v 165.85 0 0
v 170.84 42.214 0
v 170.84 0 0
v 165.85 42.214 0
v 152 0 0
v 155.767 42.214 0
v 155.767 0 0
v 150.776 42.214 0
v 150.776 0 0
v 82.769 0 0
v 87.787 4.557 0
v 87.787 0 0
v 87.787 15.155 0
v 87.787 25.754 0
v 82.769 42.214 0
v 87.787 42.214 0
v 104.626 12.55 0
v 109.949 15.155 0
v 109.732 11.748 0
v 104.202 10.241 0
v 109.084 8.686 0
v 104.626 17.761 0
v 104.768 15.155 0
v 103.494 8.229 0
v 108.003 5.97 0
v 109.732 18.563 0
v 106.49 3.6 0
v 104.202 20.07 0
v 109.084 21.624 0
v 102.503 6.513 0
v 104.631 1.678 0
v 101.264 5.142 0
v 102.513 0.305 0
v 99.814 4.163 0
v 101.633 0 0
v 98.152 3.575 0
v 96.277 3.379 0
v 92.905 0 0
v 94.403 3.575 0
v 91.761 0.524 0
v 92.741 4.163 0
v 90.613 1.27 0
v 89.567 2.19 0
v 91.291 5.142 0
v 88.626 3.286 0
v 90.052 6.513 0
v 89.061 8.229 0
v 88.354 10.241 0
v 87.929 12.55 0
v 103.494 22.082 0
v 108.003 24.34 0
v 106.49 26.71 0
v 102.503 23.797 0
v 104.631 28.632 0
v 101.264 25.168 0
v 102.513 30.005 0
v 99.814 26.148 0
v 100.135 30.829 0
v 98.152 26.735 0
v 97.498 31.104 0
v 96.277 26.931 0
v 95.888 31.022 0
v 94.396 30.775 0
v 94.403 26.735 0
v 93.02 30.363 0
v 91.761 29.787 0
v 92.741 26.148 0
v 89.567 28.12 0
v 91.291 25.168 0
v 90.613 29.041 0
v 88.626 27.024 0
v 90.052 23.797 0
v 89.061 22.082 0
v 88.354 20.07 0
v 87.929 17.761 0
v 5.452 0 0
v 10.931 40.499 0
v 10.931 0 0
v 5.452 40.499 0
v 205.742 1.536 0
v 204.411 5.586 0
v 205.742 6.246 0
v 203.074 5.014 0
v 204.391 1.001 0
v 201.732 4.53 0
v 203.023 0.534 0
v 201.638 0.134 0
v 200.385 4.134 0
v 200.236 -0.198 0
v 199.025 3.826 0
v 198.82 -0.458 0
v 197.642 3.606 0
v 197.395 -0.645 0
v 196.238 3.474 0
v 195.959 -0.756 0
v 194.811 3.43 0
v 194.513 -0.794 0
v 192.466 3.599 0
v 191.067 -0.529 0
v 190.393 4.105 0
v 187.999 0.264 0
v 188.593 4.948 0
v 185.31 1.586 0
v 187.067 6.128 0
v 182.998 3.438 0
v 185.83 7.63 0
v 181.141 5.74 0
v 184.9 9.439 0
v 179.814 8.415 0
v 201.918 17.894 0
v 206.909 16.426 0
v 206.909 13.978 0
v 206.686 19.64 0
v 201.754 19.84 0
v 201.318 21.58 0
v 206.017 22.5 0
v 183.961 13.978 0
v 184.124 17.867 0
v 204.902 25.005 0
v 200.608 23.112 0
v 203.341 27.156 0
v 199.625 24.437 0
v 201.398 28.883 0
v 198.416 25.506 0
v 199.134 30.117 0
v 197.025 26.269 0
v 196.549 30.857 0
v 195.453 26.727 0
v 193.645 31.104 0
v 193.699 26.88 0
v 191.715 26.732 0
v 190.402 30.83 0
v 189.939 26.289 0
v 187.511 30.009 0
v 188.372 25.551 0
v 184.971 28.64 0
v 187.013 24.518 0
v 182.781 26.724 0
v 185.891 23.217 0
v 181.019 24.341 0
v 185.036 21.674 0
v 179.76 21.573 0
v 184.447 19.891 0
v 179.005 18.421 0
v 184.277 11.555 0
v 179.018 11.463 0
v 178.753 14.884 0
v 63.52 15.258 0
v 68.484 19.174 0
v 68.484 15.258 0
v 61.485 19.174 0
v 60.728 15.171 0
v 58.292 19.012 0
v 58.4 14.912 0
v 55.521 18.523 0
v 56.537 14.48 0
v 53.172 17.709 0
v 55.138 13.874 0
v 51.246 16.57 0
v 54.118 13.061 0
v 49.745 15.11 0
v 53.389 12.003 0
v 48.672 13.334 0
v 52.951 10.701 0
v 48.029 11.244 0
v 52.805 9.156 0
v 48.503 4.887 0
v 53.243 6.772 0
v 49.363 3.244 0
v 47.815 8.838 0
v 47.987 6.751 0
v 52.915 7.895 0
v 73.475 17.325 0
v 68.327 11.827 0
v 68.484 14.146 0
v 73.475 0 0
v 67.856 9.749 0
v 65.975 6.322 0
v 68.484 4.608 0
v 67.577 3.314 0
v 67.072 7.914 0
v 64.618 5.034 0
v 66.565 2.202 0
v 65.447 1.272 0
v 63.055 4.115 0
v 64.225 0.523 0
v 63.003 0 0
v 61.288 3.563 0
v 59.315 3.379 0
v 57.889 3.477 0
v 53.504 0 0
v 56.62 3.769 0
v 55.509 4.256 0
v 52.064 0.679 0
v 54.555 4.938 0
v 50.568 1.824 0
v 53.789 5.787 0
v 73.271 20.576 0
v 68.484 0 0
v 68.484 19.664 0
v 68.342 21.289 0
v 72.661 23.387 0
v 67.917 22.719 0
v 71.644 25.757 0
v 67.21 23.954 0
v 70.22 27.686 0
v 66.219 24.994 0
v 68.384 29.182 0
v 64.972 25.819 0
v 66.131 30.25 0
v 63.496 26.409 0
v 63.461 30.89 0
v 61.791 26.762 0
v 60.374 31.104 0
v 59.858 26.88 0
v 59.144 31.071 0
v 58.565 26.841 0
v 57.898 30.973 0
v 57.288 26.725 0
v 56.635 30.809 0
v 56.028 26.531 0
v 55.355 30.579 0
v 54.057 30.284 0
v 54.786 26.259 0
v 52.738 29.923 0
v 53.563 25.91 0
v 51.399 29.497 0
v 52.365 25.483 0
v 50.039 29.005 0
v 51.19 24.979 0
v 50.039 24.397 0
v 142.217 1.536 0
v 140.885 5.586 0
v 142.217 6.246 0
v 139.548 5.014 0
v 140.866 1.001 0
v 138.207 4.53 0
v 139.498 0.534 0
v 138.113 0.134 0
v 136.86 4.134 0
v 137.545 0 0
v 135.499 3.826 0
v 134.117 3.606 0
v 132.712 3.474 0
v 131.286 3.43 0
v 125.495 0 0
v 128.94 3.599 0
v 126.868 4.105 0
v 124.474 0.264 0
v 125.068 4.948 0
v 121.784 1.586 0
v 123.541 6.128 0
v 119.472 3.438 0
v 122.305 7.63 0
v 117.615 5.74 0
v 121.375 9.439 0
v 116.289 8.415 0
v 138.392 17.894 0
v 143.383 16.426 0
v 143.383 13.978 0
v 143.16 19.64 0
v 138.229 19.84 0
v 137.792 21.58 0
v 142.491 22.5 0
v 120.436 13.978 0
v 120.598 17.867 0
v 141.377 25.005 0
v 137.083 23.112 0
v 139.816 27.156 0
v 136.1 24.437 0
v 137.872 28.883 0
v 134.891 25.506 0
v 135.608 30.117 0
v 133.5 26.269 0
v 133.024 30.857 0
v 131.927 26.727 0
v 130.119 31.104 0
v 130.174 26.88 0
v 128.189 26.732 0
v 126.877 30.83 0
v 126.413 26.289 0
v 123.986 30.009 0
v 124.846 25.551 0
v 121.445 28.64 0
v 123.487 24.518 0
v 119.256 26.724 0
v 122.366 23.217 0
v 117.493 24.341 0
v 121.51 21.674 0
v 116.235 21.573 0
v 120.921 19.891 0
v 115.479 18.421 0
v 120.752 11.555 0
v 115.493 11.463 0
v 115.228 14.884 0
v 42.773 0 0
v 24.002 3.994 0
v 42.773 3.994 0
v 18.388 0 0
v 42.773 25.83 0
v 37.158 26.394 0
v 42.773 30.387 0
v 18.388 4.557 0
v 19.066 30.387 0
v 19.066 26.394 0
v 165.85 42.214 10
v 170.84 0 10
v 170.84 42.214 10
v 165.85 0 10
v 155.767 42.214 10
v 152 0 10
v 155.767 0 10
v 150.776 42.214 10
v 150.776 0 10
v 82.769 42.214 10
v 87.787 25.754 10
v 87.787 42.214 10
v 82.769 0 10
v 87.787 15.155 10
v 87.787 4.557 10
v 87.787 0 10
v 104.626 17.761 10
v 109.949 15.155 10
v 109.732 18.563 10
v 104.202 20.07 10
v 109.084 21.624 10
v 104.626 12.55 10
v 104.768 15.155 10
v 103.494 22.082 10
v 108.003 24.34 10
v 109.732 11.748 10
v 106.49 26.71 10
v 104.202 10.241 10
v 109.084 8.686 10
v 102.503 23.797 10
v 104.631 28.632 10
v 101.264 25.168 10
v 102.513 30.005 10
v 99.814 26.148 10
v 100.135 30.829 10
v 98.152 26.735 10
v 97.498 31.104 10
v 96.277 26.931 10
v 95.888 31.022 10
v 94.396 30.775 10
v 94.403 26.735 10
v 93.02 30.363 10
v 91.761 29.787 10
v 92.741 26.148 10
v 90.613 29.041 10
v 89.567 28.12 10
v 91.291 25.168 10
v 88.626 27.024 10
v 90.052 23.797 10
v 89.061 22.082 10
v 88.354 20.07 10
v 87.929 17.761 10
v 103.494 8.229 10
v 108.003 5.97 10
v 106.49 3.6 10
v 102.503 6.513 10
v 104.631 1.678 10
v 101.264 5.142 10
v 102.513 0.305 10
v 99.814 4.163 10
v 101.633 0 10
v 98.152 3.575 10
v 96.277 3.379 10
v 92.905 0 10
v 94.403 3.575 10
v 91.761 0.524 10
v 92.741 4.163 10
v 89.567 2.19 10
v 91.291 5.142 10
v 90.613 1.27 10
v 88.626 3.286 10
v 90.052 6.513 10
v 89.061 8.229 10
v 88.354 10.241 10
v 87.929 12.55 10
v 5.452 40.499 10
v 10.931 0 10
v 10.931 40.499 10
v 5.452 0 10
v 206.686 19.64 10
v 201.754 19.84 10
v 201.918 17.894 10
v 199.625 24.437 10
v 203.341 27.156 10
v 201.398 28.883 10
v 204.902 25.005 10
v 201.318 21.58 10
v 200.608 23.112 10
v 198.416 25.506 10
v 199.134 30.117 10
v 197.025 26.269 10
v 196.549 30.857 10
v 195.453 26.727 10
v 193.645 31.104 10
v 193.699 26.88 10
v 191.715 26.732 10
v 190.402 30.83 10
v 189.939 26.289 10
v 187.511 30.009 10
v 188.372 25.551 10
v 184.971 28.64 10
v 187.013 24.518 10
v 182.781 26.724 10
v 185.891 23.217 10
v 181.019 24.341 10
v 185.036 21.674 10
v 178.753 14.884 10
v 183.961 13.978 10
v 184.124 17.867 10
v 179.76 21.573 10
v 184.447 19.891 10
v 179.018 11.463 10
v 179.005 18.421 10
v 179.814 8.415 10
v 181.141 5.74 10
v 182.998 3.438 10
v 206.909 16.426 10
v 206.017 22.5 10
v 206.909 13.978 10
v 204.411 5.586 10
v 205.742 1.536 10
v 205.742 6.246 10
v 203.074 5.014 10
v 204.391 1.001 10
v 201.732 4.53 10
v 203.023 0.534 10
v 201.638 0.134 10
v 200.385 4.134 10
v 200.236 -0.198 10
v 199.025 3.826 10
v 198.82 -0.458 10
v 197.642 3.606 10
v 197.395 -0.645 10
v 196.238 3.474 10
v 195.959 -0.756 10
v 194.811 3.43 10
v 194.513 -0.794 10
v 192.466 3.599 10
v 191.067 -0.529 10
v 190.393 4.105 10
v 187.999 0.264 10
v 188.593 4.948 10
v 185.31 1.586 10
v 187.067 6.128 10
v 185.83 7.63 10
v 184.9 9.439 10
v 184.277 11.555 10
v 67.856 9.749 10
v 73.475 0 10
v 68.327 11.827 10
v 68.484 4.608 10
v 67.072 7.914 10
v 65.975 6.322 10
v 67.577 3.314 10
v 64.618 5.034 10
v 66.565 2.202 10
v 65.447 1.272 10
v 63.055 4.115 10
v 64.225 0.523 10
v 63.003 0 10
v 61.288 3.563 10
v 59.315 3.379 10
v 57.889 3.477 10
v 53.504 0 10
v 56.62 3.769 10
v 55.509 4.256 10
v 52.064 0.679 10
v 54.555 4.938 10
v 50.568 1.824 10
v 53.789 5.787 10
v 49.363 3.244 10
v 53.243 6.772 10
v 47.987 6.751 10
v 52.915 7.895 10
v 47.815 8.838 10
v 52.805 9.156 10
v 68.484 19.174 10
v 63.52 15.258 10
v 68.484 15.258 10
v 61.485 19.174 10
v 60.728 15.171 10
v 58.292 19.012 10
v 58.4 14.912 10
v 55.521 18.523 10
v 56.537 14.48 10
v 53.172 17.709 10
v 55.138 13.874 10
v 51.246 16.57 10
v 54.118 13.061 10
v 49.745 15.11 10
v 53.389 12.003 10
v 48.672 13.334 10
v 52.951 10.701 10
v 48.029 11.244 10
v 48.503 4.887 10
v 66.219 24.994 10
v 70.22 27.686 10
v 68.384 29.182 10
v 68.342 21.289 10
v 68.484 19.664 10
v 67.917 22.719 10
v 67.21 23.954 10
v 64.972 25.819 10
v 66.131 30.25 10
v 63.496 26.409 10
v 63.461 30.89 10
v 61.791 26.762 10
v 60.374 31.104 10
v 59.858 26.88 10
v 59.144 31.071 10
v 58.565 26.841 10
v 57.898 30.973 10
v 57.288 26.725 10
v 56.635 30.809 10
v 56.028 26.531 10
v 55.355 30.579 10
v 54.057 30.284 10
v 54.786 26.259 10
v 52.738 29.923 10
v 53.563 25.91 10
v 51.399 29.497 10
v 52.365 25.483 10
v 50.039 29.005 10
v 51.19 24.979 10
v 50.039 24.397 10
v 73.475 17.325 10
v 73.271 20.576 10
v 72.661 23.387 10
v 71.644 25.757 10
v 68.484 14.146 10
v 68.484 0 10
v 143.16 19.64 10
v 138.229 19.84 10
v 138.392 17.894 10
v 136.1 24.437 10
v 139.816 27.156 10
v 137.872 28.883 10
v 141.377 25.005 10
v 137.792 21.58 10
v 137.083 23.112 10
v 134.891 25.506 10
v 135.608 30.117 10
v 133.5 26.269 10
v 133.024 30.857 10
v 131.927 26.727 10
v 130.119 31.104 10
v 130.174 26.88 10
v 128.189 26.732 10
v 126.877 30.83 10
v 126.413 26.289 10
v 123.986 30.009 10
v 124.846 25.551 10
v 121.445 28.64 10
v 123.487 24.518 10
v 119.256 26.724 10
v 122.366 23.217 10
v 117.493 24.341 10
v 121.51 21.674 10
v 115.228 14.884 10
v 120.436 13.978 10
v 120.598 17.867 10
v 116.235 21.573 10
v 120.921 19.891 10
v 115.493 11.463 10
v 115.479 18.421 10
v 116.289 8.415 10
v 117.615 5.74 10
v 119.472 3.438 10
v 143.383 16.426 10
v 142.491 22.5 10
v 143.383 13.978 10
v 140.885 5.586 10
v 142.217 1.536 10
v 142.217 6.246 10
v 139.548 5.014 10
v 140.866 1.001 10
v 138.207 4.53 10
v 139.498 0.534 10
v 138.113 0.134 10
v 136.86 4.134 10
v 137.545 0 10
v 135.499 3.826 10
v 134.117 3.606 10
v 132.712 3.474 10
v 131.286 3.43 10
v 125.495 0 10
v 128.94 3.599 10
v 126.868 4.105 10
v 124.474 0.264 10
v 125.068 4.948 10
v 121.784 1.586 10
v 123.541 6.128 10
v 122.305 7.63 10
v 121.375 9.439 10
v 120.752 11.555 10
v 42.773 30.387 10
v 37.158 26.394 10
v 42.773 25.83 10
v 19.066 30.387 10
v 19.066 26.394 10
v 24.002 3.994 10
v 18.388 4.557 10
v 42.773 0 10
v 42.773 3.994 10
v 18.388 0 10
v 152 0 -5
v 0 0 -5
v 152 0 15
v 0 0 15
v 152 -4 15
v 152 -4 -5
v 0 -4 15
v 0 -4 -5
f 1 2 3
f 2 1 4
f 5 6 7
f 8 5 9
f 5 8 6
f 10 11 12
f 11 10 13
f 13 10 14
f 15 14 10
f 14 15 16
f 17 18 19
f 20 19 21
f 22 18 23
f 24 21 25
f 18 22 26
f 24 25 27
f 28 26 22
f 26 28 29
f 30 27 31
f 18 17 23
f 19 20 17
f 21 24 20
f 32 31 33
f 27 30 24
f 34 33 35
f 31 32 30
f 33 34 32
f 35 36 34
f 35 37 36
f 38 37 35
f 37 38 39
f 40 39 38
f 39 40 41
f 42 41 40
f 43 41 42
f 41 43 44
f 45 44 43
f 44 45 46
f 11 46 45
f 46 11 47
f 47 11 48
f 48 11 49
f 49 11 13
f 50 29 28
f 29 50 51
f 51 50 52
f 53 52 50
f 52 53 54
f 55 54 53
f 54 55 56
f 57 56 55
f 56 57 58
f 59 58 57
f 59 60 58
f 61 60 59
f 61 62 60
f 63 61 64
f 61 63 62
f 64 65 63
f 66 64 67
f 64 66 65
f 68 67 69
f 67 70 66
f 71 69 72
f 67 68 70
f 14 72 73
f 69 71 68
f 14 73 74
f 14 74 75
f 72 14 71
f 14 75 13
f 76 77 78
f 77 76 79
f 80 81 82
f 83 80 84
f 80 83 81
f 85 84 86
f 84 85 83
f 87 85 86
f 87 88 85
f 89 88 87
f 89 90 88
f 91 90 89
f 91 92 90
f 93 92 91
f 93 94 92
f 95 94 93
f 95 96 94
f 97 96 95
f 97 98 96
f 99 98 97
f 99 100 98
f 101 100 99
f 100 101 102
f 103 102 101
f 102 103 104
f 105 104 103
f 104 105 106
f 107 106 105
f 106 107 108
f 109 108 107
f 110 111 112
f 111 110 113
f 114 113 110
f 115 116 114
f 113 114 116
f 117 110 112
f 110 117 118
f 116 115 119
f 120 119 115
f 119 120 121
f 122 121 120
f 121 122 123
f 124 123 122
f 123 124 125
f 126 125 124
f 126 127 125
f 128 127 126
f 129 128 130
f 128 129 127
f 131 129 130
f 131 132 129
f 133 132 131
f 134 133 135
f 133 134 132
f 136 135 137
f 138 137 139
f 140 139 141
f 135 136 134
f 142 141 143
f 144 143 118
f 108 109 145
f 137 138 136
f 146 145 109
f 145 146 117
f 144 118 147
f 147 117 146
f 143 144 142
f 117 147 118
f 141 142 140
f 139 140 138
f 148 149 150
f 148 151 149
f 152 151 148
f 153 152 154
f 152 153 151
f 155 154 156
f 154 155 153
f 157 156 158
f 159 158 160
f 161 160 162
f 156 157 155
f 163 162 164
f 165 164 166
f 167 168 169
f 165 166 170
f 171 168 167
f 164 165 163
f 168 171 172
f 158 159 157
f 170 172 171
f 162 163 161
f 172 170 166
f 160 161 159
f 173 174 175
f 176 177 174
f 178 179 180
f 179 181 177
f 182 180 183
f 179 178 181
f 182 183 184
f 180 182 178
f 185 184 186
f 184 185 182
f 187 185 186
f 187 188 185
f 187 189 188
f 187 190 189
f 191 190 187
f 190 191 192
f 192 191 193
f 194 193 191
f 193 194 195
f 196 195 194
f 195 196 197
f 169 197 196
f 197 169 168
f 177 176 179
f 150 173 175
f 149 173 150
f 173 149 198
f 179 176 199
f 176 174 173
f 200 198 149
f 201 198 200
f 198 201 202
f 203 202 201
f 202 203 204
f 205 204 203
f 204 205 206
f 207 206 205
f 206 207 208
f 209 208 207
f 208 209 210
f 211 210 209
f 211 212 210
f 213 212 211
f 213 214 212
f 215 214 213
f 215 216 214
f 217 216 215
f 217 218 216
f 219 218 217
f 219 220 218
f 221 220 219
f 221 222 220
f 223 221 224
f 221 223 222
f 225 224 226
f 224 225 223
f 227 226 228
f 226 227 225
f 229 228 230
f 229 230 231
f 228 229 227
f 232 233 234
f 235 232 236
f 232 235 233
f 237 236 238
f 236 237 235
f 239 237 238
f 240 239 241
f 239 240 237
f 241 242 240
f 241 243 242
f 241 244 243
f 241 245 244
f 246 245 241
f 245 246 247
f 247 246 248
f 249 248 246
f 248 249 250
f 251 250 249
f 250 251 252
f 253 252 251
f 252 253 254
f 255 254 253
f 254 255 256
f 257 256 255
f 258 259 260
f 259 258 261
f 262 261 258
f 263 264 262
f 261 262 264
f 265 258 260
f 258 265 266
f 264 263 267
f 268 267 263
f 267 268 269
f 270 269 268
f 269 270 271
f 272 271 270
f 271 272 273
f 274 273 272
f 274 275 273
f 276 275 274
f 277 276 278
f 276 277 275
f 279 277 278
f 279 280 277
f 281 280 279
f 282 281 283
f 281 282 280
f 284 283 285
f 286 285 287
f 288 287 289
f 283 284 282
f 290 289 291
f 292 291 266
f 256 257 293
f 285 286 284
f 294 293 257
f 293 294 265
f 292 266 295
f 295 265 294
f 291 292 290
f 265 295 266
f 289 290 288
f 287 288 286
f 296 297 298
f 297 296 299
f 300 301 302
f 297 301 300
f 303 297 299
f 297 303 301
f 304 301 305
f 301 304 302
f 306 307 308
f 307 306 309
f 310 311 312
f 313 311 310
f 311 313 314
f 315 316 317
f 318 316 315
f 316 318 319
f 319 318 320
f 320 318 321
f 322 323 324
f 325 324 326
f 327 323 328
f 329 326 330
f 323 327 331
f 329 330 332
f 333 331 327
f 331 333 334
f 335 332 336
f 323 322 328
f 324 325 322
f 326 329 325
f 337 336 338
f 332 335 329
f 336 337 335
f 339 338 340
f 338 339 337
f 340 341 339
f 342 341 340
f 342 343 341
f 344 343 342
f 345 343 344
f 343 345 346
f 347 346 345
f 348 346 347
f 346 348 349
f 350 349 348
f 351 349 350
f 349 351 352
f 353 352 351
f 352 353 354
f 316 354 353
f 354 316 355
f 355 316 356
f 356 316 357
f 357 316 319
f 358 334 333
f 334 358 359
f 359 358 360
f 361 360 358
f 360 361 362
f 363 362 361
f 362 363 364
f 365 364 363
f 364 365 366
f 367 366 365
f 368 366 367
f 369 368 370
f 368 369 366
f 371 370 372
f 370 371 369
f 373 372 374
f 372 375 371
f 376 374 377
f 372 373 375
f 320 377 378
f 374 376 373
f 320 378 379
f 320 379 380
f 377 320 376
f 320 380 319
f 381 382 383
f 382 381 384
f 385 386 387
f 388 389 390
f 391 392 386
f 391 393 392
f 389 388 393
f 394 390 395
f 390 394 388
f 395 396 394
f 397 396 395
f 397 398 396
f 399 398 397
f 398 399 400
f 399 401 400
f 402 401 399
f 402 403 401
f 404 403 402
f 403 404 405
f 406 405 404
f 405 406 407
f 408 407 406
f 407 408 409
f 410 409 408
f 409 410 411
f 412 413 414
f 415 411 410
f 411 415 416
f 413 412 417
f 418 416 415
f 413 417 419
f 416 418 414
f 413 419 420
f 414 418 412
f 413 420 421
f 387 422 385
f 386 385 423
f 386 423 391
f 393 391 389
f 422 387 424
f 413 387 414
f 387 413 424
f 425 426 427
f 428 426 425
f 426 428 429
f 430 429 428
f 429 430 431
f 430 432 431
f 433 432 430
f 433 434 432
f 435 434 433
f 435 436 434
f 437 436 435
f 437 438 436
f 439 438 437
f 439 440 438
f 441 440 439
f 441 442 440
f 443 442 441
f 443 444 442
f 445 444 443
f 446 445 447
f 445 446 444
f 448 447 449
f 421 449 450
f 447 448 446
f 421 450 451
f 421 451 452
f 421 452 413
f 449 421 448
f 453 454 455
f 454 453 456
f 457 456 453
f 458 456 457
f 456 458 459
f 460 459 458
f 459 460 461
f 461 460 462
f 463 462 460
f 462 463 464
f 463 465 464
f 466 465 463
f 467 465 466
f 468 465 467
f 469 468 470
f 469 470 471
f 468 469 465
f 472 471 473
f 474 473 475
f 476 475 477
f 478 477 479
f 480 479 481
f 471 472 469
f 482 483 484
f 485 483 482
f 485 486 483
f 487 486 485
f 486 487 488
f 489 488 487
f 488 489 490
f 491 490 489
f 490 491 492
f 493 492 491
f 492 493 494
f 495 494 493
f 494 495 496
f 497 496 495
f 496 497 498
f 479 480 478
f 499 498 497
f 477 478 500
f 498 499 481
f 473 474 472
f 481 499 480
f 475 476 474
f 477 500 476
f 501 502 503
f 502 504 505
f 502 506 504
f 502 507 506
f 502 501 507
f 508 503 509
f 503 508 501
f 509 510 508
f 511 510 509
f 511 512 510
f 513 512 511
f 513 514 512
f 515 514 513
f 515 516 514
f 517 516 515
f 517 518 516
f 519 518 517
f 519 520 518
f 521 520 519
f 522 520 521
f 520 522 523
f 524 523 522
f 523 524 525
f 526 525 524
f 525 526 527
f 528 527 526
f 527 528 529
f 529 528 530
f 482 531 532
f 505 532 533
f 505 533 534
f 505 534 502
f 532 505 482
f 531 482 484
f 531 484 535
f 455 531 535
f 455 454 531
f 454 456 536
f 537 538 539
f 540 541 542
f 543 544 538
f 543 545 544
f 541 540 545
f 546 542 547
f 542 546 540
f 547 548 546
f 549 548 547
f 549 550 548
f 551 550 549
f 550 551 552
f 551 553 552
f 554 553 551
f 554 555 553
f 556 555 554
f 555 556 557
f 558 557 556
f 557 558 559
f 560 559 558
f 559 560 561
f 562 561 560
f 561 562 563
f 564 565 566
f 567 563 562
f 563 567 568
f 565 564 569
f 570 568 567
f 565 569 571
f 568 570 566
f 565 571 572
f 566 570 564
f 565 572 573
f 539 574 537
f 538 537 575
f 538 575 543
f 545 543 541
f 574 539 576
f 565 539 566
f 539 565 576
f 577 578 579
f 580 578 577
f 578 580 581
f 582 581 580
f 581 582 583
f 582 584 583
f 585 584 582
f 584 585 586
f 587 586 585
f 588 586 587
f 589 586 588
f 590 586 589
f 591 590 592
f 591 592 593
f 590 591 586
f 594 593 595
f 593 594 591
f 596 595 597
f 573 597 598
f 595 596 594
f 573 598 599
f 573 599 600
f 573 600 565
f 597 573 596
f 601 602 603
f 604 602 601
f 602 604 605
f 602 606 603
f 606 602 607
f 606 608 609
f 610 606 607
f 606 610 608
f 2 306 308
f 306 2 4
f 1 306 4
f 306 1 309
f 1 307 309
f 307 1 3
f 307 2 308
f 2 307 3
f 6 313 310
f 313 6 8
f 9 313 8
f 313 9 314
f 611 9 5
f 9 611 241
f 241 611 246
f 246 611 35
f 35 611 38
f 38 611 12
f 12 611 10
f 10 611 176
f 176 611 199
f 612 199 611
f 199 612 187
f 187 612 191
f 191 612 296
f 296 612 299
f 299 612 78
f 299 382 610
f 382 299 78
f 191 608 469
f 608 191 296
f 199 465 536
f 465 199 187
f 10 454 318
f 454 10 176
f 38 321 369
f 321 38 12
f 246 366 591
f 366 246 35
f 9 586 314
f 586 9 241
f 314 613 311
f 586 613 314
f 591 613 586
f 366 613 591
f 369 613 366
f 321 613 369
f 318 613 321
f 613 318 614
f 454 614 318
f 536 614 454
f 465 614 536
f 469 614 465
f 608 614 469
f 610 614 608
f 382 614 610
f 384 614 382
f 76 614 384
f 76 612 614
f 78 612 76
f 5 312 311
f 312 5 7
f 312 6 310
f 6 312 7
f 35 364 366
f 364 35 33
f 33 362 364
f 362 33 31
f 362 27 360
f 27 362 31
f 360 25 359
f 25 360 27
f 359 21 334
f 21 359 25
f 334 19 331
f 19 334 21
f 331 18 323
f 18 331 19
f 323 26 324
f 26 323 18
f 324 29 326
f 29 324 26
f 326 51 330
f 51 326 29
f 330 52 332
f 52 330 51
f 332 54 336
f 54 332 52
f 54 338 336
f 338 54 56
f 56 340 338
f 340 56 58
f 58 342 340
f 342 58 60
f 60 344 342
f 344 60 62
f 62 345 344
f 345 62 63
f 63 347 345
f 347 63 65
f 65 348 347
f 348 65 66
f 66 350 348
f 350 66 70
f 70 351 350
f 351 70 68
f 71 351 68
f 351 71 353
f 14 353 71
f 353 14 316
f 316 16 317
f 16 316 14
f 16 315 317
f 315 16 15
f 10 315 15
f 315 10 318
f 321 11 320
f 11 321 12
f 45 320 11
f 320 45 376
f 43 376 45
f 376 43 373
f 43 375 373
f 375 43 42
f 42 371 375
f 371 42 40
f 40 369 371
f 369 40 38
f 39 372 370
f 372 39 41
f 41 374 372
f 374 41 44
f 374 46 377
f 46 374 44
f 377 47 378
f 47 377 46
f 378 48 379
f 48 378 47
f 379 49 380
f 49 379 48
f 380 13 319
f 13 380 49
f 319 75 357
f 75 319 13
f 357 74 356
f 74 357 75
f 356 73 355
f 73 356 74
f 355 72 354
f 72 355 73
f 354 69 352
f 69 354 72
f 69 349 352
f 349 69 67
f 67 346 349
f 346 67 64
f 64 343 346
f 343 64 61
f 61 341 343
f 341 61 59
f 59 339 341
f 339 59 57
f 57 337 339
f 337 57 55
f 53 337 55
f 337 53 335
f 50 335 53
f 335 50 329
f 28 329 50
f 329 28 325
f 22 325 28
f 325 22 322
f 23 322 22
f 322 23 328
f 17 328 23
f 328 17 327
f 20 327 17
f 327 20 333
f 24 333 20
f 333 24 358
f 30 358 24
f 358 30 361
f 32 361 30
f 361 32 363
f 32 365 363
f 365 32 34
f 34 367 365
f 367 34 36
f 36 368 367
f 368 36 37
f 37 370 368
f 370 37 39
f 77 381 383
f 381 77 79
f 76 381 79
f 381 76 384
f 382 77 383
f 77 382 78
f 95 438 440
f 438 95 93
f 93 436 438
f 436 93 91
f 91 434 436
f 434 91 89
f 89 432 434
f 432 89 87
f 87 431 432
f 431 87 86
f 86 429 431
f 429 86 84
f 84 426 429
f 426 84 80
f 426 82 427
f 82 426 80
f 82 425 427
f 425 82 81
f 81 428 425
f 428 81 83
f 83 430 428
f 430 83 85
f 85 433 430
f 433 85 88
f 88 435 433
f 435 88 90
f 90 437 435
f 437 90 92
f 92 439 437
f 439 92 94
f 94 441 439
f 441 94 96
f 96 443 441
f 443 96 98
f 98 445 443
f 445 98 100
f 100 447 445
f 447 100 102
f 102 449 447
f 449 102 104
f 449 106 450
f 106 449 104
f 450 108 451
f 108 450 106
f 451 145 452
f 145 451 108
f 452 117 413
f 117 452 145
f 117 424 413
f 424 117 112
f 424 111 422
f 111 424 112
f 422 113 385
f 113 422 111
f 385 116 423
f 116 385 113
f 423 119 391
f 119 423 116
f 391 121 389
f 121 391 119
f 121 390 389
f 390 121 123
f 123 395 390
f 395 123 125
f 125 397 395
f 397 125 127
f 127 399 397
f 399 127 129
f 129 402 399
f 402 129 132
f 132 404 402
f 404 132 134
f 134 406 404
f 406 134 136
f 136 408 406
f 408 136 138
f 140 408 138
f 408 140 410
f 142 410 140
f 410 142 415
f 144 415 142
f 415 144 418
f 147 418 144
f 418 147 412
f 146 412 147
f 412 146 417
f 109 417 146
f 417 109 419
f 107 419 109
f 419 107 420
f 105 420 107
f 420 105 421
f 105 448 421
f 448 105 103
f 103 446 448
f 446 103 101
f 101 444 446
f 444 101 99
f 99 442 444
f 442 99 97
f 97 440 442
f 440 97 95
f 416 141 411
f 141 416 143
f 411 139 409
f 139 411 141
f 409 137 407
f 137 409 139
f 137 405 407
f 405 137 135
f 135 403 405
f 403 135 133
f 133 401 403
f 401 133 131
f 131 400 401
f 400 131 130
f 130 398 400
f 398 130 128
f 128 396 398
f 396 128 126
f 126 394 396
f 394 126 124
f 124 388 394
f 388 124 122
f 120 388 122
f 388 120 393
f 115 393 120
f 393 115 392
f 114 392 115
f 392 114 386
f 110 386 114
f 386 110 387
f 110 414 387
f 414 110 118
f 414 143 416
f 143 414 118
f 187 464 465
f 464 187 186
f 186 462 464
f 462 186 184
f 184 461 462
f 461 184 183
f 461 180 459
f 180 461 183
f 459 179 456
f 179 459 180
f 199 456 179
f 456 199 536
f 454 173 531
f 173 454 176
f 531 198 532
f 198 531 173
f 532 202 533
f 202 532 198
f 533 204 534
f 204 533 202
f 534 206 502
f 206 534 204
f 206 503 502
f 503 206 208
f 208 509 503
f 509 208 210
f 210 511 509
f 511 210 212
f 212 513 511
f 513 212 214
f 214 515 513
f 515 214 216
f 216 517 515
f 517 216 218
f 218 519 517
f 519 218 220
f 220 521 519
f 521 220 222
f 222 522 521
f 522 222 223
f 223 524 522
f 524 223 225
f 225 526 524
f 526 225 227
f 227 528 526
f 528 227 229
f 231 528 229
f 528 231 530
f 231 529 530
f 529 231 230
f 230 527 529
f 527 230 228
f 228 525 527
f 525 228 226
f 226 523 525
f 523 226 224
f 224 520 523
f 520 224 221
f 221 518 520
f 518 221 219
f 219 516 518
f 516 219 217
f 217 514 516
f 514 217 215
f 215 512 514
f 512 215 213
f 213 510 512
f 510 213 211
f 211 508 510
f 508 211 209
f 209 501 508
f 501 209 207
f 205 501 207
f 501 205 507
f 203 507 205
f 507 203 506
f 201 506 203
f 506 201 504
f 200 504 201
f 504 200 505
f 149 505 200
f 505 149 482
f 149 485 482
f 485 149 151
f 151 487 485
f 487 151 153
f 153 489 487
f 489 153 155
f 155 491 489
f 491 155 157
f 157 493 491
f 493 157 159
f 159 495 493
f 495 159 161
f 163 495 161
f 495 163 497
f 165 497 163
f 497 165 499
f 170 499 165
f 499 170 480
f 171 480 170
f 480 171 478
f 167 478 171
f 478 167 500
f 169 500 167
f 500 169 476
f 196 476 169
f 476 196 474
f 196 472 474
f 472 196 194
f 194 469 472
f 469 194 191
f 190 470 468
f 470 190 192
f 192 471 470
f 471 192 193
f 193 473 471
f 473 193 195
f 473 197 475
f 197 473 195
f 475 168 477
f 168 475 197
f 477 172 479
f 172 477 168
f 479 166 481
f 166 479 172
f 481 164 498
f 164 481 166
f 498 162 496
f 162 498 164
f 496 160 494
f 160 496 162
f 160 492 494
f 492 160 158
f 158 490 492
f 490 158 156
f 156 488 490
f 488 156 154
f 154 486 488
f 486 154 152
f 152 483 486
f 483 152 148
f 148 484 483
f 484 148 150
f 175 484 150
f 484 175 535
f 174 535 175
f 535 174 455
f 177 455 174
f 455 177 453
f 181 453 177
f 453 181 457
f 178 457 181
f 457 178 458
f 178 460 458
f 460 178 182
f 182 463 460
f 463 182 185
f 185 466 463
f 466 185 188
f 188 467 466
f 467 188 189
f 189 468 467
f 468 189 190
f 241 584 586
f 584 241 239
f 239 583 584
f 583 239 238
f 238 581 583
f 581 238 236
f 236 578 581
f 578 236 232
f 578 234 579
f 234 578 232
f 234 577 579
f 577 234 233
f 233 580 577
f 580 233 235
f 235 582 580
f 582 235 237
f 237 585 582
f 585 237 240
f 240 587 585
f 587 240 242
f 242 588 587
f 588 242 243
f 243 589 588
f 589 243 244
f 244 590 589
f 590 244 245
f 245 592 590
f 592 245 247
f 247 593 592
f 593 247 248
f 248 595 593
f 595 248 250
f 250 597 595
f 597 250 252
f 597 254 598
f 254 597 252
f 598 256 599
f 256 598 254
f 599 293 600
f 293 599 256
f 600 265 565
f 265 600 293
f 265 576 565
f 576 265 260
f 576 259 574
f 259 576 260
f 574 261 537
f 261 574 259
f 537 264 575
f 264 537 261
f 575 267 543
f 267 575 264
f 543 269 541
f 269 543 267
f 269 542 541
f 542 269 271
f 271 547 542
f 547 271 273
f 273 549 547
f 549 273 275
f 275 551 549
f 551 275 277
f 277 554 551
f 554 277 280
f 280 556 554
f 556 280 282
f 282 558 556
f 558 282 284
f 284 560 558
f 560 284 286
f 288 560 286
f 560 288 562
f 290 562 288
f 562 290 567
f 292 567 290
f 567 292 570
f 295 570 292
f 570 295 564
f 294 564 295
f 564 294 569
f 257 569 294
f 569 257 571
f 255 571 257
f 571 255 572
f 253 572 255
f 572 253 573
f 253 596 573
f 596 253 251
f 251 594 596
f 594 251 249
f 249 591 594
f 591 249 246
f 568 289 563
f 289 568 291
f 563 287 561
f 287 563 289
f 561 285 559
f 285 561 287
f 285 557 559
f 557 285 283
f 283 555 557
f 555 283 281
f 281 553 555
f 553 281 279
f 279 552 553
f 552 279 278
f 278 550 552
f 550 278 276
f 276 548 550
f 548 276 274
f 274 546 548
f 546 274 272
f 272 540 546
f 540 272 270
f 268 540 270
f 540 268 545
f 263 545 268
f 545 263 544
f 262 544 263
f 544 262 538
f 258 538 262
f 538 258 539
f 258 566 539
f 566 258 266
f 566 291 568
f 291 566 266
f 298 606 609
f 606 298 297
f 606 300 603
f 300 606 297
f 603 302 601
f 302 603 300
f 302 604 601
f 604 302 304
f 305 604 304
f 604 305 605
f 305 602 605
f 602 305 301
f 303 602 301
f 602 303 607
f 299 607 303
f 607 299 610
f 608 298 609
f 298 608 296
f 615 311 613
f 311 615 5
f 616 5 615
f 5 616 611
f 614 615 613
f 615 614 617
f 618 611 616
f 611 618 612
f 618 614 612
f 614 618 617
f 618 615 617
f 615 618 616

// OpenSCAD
union() {
    linear_extrude(10) text("Izabelle",40,"Curlz MT");
    translate([0,-4,-5]) cube([152,4,20]);
}
